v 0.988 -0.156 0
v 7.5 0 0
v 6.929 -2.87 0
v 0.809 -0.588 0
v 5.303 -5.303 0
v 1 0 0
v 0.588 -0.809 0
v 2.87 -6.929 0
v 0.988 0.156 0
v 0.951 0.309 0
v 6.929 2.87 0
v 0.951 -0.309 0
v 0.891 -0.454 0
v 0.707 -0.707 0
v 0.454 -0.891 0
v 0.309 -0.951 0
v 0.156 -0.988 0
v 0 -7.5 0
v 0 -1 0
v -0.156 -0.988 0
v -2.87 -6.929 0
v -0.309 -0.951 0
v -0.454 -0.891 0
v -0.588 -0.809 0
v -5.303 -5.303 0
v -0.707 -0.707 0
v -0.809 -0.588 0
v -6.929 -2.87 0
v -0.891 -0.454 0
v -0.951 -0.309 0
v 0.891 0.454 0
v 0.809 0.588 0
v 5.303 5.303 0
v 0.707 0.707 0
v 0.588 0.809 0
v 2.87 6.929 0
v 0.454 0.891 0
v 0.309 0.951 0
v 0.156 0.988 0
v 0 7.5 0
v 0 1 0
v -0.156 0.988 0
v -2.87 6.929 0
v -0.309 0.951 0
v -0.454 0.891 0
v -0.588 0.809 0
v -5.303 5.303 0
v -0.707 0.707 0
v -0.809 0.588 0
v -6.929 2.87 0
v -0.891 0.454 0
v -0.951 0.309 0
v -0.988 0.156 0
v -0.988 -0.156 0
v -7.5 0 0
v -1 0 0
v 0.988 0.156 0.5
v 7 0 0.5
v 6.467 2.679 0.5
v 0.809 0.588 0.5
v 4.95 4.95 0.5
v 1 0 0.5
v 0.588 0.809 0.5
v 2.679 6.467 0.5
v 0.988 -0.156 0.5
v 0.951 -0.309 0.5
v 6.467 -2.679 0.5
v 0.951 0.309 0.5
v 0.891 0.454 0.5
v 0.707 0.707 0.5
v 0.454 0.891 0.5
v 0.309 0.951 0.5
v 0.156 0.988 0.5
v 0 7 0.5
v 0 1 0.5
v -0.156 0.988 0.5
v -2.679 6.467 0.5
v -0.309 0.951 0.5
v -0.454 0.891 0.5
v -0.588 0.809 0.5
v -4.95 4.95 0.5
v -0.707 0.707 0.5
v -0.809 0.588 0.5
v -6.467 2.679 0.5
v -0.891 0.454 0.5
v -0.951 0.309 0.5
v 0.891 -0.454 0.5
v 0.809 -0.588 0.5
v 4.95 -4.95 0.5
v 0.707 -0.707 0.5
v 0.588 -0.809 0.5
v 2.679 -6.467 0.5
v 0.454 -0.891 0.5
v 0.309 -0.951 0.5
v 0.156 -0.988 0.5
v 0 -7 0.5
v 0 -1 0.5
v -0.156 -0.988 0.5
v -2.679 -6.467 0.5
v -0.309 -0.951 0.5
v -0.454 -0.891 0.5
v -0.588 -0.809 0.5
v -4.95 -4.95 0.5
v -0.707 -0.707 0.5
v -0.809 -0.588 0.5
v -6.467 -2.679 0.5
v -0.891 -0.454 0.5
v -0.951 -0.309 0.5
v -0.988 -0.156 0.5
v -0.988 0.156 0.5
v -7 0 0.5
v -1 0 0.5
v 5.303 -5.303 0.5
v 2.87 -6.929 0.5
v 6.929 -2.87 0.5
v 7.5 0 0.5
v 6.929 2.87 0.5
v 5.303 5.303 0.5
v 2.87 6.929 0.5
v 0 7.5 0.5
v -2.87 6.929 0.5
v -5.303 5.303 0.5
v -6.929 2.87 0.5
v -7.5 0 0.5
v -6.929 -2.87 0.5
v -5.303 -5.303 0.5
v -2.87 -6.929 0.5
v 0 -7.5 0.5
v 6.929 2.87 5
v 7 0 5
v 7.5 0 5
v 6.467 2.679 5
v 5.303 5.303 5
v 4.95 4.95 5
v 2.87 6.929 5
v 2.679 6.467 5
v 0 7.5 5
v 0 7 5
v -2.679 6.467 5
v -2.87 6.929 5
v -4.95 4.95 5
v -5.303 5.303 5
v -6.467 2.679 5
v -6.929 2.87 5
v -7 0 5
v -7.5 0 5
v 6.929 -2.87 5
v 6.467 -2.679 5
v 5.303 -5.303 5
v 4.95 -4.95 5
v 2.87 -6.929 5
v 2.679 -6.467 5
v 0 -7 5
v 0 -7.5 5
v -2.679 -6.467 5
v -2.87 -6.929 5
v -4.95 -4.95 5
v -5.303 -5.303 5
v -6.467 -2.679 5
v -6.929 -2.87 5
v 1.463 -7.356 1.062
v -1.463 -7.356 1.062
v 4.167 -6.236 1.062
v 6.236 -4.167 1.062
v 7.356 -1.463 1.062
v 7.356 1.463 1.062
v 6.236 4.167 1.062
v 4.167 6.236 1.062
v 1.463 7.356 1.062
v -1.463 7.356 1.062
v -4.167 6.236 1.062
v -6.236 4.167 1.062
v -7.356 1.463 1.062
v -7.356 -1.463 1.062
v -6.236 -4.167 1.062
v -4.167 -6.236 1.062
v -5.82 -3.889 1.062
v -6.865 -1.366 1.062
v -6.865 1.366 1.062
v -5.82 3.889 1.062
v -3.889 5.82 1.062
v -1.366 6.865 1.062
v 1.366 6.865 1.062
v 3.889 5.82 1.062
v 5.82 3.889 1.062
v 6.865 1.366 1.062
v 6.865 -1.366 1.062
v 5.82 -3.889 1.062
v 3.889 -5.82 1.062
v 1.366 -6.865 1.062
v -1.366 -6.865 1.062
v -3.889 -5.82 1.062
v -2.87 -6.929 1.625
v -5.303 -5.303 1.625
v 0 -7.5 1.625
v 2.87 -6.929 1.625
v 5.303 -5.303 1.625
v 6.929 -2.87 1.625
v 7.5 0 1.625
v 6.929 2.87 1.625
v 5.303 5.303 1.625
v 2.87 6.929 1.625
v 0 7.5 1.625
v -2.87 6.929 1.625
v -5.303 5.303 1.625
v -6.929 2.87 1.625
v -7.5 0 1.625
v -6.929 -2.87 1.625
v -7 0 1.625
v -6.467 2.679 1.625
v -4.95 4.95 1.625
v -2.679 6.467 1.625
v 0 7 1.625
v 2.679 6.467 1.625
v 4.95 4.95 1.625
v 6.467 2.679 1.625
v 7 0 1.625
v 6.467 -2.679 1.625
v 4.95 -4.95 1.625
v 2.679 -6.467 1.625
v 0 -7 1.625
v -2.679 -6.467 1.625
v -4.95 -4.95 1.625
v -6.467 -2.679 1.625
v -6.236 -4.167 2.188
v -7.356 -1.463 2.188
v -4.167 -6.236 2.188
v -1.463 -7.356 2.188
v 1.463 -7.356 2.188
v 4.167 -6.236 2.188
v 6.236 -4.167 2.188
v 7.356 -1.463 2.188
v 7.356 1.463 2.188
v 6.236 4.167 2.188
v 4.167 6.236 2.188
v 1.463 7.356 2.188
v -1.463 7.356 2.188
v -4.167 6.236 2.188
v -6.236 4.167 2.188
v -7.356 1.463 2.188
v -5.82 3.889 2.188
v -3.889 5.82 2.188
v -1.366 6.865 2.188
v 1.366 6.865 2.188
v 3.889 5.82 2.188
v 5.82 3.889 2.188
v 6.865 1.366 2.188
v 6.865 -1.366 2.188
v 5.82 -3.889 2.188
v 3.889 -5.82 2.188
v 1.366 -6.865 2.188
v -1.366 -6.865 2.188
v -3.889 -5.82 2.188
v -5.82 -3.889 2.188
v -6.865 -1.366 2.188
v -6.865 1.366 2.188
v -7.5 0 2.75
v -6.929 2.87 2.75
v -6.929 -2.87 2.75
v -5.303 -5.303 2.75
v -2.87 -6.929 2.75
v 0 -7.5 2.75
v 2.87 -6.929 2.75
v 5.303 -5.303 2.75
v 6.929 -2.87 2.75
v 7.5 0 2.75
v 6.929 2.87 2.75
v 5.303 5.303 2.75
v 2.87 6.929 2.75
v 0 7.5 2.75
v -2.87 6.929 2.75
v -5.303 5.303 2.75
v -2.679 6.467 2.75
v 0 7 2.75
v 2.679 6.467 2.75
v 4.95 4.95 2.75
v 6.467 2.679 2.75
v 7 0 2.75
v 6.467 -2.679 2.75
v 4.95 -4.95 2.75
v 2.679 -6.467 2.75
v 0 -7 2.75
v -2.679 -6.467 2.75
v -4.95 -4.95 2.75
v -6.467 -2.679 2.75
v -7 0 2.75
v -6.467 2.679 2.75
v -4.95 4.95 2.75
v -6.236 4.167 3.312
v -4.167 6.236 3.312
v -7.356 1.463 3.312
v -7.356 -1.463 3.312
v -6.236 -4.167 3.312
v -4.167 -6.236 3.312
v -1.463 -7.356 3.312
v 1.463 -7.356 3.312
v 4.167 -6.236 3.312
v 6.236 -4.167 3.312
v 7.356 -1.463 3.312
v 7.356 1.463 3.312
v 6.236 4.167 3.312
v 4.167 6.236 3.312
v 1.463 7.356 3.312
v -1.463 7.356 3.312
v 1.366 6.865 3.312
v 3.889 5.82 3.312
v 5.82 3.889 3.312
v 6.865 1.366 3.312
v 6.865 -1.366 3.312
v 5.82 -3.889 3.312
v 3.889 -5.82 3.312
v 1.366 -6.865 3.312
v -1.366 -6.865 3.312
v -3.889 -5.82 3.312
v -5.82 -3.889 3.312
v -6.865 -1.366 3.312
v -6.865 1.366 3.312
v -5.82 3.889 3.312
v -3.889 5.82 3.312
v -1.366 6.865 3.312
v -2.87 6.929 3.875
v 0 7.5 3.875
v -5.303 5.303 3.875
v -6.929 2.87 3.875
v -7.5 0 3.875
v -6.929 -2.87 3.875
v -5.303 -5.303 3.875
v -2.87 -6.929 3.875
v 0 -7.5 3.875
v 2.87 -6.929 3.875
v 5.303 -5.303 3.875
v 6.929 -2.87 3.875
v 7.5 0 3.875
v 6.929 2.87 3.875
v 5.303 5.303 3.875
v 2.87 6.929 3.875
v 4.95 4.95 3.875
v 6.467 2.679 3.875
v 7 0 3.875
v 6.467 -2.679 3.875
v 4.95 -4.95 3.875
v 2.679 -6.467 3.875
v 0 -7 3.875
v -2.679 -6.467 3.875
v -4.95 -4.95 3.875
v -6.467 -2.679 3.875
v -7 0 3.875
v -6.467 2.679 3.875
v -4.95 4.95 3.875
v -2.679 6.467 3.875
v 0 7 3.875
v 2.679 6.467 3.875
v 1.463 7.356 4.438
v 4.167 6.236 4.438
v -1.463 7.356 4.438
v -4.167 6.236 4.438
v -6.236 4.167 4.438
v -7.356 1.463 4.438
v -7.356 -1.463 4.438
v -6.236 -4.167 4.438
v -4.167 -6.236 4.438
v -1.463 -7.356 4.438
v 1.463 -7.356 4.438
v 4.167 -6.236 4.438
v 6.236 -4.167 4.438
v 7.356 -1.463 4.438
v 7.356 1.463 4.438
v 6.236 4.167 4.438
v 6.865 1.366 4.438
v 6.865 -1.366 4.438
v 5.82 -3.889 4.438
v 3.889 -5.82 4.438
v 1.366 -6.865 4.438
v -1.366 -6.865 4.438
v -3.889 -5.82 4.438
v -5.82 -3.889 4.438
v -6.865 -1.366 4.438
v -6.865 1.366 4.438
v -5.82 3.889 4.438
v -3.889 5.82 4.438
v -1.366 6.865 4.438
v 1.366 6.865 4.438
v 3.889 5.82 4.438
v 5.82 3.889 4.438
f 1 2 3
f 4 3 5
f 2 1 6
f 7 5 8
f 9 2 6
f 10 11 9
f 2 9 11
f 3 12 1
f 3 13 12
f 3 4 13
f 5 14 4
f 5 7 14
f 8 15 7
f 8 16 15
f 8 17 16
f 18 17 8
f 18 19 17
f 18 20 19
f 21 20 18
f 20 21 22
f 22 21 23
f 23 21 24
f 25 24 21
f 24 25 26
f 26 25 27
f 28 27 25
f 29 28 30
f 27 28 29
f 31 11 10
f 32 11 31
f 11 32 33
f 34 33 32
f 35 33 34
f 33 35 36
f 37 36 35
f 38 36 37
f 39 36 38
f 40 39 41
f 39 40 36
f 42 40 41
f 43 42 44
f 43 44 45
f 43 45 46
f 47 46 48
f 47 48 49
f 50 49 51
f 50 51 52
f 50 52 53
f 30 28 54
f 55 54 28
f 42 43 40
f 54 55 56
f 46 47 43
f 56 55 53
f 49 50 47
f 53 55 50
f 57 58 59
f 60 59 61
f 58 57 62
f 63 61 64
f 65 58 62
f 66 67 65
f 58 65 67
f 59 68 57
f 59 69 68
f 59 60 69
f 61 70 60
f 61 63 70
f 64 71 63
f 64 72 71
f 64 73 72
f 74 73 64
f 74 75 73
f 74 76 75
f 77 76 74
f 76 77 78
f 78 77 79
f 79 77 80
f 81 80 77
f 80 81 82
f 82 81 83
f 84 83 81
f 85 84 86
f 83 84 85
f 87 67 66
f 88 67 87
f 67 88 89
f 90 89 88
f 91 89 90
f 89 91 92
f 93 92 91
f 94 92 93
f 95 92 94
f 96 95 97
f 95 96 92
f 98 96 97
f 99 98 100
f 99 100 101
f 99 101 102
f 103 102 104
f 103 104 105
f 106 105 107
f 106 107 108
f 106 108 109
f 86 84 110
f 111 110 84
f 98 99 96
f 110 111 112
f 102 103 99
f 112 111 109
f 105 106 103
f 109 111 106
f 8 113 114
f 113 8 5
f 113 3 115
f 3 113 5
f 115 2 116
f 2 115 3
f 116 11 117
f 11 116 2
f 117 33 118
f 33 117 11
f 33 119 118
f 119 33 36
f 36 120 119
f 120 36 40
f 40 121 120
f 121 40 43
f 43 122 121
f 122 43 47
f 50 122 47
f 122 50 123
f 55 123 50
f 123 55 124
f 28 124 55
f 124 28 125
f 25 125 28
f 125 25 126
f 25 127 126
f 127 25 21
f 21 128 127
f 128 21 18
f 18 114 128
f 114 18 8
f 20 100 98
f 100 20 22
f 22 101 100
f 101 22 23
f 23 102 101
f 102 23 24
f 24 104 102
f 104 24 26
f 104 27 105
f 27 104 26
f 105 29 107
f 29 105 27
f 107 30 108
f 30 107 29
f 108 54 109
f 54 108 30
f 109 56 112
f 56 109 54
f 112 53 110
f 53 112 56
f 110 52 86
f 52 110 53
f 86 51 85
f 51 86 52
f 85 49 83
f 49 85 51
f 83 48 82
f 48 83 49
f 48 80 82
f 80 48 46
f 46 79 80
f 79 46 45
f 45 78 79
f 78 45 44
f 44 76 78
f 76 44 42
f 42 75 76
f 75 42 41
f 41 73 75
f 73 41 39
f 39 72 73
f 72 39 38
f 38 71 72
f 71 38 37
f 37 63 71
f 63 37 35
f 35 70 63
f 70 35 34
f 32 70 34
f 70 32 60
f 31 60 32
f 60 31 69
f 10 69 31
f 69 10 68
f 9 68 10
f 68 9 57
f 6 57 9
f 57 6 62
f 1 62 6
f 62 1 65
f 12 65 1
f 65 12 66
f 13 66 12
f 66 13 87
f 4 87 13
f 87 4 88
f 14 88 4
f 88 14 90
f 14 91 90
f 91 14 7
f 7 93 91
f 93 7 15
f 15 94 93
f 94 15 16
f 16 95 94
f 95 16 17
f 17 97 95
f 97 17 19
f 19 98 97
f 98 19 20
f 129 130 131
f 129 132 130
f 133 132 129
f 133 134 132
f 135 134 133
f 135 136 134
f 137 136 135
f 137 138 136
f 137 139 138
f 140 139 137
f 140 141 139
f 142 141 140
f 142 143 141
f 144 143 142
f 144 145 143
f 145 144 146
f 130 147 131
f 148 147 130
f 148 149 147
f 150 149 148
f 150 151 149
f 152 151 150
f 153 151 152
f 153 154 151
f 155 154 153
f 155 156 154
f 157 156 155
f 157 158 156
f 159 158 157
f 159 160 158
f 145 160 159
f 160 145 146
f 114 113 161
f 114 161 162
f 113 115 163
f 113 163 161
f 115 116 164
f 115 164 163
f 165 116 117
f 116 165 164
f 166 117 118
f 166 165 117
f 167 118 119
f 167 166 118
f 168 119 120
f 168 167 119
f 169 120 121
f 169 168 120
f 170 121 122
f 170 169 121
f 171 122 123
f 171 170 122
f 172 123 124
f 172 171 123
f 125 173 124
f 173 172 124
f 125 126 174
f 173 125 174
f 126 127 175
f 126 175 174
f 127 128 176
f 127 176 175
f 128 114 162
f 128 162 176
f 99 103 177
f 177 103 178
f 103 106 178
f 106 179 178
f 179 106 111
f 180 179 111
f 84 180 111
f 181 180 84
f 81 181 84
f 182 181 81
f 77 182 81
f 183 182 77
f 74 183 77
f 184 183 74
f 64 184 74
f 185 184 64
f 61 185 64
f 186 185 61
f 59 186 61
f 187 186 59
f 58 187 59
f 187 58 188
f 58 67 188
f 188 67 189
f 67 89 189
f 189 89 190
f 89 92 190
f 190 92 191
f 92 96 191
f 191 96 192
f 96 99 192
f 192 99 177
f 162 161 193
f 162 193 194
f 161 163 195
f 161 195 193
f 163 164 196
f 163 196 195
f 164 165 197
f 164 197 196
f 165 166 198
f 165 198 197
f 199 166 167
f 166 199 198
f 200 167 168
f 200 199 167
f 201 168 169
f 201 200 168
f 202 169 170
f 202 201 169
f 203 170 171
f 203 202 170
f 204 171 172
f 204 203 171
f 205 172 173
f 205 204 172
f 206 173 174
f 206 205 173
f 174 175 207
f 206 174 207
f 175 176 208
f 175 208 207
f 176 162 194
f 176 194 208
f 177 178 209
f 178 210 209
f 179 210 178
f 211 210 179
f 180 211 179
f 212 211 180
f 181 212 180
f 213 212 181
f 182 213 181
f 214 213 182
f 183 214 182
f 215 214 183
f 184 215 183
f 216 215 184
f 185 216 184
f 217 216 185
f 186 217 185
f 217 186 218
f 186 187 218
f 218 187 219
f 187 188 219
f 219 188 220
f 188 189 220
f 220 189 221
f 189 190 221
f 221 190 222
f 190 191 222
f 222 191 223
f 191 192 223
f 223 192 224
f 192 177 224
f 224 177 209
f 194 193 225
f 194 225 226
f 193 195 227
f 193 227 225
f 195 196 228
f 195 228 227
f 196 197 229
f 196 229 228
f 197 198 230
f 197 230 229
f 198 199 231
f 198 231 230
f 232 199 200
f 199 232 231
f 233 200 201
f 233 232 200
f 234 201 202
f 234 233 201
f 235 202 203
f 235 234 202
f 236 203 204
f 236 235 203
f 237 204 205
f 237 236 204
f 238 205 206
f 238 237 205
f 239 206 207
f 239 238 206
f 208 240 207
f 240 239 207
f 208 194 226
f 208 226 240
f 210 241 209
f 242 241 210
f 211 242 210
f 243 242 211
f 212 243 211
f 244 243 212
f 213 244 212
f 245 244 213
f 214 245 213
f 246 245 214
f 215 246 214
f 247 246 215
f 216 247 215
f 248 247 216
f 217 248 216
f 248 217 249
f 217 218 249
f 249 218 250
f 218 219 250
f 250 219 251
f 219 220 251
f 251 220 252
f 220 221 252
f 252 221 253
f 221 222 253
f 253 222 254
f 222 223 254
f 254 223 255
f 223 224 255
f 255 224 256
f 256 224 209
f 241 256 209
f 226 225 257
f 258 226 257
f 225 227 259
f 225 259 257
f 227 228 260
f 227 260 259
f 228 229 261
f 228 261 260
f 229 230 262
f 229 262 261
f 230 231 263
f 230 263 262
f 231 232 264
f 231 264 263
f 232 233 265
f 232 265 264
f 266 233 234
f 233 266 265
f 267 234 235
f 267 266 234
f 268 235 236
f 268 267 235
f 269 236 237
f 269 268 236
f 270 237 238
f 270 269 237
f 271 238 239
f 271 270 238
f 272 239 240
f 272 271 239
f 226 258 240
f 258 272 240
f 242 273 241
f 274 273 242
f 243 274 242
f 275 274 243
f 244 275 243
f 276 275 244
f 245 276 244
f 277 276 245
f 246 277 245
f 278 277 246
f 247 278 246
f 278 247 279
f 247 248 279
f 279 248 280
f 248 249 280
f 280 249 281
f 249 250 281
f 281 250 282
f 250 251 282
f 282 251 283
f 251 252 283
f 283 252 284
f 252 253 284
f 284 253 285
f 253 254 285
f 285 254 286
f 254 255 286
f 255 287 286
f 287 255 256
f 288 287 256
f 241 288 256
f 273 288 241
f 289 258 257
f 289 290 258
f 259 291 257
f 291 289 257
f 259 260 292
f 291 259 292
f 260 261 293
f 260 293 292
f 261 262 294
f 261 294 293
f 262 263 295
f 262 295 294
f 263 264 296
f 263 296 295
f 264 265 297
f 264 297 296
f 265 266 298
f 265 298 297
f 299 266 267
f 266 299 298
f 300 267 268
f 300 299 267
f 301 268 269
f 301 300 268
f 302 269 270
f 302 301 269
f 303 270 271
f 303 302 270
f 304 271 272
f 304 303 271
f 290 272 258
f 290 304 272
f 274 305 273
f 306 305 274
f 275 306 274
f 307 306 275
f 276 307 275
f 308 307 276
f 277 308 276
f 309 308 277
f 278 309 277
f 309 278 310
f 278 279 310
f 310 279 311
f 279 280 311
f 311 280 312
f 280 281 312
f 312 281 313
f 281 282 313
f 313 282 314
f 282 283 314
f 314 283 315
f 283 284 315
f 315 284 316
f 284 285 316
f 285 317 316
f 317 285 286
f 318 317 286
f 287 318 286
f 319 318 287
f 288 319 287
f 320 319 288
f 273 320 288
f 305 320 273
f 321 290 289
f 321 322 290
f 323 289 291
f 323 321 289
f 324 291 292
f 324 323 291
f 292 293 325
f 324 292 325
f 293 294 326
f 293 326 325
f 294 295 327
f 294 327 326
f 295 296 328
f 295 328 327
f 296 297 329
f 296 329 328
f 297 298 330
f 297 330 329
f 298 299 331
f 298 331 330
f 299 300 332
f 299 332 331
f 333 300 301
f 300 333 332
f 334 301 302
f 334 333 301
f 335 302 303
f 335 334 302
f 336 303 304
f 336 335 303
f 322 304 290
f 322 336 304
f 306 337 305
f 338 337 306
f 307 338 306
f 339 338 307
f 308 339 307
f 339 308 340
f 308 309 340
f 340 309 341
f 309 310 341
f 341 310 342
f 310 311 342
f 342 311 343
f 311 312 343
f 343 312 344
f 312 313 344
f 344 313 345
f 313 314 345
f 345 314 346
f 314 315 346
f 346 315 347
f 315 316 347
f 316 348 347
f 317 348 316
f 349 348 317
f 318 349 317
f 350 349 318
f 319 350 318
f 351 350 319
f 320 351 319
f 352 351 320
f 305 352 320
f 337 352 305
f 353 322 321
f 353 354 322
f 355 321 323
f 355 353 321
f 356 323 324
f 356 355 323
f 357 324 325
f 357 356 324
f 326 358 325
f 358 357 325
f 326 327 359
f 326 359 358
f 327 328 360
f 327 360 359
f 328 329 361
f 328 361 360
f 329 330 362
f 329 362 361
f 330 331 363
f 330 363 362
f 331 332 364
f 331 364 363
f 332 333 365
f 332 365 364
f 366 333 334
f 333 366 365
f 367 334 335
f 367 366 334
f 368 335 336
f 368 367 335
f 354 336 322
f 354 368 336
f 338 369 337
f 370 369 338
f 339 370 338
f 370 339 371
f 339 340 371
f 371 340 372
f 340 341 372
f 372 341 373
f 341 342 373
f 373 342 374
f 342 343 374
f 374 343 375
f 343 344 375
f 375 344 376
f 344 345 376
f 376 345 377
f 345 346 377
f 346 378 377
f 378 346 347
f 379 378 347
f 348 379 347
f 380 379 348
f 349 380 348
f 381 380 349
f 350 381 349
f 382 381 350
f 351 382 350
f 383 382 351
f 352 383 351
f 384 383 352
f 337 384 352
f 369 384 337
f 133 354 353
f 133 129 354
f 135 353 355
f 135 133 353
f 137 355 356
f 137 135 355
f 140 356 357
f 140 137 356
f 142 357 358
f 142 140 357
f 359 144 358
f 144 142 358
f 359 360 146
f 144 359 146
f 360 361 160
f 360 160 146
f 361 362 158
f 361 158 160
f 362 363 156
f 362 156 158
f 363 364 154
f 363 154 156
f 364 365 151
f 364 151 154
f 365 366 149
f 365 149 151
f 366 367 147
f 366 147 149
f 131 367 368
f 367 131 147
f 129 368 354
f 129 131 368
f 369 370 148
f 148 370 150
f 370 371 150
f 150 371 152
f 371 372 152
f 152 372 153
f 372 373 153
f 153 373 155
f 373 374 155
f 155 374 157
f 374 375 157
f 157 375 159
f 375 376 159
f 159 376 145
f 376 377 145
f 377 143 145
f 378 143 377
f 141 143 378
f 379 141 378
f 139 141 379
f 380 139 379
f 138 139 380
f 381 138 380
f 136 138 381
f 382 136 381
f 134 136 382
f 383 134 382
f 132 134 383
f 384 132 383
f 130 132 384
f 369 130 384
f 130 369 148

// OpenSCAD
module geometric_planter(height, width, wall_thickness=0.5, sides=4, base_thickness) {
	echo(base_thickness);
	base_thickness = base_thickness == undef ? wall_thickness : base_thickness;

	//Draws base layer
	linear_extrude(height=base_thickness) {
		difference() {
			circle(d=width, $fn=sides);
			circle(1, $fn = 40);
		}
	}
	
	//Draws twist
	translate([0,0,base_thickness]) {
		linear_extrude(height=height-base_thickness, twist=270, slices=8) {
			difference() {
				circle(d=width, $fn=sides);
				circle(d=width-wall_thickness, $fn=sides);

			}
		}
	}
}

geometric_planter(height=5, width=15, sides=16, wall_thickness=1, base_thickness=0.5);
